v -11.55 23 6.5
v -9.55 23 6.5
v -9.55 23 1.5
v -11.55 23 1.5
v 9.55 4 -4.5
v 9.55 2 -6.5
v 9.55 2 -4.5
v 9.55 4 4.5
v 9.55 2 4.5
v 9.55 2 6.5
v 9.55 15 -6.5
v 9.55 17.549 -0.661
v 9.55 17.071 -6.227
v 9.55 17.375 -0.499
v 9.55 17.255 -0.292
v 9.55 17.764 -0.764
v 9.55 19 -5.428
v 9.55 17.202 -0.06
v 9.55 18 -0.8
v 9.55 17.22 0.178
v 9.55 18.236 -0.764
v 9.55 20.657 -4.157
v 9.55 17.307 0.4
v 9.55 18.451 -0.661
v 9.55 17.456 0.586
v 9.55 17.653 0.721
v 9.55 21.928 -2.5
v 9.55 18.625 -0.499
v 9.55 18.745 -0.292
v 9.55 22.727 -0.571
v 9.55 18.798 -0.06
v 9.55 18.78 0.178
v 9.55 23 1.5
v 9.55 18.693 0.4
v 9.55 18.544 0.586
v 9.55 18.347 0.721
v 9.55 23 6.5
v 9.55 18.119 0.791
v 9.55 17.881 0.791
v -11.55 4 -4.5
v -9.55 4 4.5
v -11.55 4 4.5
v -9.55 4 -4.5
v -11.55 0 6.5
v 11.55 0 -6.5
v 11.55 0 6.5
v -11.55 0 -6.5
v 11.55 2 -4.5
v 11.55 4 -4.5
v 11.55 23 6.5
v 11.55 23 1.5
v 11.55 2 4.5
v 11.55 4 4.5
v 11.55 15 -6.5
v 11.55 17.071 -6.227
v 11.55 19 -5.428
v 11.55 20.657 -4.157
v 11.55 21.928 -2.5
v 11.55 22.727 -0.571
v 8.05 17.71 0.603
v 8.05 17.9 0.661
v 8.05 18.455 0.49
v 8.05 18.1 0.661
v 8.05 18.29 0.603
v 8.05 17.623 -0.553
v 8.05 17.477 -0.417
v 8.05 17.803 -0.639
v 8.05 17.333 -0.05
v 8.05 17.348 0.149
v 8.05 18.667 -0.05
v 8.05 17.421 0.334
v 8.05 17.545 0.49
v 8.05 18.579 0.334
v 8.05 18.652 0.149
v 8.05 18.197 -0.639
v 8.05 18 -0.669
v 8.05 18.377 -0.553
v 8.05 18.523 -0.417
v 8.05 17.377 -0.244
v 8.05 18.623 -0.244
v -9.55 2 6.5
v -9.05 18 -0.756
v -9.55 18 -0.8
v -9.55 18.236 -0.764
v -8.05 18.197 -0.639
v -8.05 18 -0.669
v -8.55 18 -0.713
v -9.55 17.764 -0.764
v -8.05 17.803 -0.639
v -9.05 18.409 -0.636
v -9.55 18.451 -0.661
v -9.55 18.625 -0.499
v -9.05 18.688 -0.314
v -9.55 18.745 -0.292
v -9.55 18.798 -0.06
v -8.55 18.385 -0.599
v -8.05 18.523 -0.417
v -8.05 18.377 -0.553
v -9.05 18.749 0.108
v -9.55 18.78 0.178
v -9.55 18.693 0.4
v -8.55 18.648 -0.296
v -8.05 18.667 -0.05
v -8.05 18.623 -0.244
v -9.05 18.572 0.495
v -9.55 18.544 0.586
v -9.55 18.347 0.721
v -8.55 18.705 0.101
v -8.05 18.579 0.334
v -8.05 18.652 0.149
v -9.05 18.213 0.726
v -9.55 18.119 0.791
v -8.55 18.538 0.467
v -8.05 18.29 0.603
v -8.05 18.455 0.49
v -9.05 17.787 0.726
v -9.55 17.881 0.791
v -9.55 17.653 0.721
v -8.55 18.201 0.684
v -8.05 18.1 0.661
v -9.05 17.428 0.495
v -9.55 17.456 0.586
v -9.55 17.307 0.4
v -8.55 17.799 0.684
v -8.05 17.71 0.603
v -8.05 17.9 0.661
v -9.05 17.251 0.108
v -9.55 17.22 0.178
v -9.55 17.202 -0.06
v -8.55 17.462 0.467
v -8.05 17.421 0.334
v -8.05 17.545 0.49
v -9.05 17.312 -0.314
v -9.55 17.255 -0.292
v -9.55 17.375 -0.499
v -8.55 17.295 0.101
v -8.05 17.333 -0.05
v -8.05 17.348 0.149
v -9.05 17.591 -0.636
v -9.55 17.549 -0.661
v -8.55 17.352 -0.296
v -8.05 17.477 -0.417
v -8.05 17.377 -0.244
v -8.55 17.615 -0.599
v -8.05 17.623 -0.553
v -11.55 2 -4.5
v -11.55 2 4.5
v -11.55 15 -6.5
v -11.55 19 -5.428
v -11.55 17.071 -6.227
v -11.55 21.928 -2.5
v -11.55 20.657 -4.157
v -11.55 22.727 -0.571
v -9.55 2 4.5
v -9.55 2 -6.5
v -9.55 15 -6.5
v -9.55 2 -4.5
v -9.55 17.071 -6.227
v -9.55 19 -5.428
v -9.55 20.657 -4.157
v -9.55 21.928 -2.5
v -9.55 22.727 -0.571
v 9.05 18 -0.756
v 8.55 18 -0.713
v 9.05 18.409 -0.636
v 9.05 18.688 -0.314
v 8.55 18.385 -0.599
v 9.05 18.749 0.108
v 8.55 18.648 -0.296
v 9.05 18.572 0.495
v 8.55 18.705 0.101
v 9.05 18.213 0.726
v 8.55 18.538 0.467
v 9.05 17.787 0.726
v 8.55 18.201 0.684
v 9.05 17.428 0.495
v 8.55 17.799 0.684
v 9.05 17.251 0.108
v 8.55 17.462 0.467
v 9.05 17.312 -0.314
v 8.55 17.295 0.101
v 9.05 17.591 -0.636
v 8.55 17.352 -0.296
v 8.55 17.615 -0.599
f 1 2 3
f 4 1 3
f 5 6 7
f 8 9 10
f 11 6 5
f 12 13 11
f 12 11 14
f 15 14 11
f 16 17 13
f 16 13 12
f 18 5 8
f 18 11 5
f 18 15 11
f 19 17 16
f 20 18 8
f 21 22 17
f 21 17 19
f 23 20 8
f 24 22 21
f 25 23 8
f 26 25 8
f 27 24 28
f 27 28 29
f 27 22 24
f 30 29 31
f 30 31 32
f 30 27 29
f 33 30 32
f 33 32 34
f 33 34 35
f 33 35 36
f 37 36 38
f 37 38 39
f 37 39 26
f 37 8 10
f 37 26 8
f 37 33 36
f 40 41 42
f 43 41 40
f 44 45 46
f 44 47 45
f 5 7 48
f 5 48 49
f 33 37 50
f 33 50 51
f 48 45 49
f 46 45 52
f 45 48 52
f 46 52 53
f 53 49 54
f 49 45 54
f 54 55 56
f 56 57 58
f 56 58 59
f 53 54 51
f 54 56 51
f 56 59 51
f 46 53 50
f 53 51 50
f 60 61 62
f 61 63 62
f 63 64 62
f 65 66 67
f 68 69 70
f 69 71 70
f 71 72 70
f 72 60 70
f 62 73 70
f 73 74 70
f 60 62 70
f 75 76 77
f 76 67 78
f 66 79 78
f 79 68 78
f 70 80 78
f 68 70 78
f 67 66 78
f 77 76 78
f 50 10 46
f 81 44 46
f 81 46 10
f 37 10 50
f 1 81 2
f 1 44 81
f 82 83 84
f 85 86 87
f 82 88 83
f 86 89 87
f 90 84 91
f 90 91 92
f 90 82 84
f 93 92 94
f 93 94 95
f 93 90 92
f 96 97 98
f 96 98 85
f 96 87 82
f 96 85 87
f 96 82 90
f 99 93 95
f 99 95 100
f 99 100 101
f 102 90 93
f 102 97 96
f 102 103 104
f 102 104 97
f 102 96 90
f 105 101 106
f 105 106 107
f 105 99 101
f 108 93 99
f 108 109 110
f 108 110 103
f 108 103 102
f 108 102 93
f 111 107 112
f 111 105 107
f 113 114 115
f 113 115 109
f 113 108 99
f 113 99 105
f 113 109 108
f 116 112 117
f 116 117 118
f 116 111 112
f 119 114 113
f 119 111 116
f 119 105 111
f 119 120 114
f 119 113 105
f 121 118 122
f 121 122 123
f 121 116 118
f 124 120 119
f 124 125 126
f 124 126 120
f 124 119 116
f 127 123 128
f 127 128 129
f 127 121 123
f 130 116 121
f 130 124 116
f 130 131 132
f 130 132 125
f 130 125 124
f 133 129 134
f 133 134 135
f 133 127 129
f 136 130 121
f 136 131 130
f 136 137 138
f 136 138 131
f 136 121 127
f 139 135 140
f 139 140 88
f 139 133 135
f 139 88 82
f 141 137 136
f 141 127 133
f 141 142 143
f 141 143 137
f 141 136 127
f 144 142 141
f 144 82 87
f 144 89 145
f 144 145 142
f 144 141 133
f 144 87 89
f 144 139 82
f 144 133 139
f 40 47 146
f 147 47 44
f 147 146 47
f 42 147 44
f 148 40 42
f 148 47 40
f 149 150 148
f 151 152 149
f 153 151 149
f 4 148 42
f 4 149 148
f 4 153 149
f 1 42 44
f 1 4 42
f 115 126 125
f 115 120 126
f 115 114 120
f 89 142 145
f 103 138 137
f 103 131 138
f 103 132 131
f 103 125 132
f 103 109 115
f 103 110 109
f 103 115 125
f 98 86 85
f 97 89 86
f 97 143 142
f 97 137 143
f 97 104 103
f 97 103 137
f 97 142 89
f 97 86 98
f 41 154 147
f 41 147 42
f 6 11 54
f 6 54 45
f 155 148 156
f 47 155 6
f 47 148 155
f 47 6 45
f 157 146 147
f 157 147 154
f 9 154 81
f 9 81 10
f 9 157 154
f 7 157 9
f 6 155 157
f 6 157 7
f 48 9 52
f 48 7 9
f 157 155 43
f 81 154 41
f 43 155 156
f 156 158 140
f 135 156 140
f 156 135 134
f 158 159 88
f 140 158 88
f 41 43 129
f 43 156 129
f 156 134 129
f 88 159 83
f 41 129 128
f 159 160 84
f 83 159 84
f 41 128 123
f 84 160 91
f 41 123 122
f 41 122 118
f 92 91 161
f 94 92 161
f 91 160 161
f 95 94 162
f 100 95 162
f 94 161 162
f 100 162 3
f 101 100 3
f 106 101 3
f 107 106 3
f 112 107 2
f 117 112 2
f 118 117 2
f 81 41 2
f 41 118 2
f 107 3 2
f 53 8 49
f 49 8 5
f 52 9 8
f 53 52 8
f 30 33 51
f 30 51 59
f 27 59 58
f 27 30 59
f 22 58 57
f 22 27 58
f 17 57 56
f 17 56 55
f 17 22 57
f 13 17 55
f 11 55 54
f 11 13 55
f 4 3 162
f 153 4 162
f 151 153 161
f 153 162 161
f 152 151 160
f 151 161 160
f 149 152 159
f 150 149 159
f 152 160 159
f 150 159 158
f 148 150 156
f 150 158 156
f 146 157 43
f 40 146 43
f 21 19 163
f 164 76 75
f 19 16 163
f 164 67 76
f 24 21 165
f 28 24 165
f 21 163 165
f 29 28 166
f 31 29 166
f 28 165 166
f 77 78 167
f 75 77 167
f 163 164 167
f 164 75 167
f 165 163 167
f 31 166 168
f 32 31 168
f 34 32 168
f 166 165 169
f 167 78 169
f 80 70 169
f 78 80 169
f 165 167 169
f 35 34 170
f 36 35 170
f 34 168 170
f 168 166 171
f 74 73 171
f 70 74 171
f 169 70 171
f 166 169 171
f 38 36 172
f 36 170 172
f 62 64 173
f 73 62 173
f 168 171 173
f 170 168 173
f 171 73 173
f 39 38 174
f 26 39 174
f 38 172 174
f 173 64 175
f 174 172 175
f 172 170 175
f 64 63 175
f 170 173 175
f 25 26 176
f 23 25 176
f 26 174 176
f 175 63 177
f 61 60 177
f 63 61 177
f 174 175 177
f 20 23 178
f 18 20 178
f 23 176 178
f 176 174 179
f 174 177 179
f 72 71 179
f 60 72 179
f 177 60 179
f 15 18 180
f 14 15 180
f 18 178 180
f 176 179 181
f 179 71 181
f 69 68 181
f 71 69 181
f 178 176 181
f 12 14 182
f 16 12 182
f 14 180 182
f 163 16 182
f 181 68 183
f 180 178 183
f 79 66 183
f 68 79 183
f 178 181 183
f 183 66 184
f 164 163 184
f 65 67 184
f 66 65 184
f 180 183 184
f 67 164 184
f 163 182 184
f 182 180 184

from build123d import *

# Parameters (mm, degrees)
SKETCH2_W           = 19.1
SKETCH2_H           = 13
BOSS_EXTRUDE1_DEPTH = 2
BOSS_EXTRUDE2_DEPTH = 2
SKETCH4_R           = 0.8
BOSS_EXTRUDE3_DEPTH = 1.5
BOSS_EXTRUDE3_TAPER = 5
SKETCH5_W           = 9
SKETCH5_H           = 2
CUT_EXTRUDE1_DEPTH  = 2


with BuildPart() as part:
    # Sketch2 → Boss-Extrude1 (new body)
    with BuildSketch(Plane(origin=(0, 0, 0), x_dir=(1, 0, 0), z_dir=(0, 1, 0))):
        Rectangle(SKETCH2_W, SKETCH2_H)
    extrude(amount=BOSS_EXTRUDE1_DEPTH)

    # Sketch3 → Boss-Extrude2 (add)
    with BuildSketch(Plane.ZY.offset(9.55)):
        with BuildLine():
            Line((6.5, 0), (6.5, 23))
            Line((6.5, 23), (1.5, 23))
            ThreePointArc((1.5, 23), (-4.156854249, 20.656854249), (-6.5, 15))
            Line((-6.5, 15), (-6.5, 0))
            Line((-6.5, 0), (6.5, 0))
        make_face()
    boss_extrude2 = extrude(amount=BOSS_EXTRUDE2_DEPTH)

    # Sketch4 → Boss-Extrude3 (add)
    with BuildSketch(Plane(origin=(-9.55, 0, 0), x_dir=(0, 0, -1), z_dir=(1, 0, 0))):
        with Locations((0, 18)):
            Circle(SKETCH4_R)
    boss_extrude3 = extrude(amount=BOSS_EXTRUDE3_DEPTH, taper=BOSS_EXTRUDE3_TAPER)

    # Sketch5 → Cut-Extrude1 (cut)
    with BuildSketch(Plane(origin=(-9.55, 0, 0), x_dir=(0, 0, -1), z_dir=(1, 0, 0))):
        with Locations((0, 3)):
            Rectangle(SKETCH5_W, SKETCH5_H)
    cut_extrude1 = extrude(amount=-CUT_EXTRUDE1_DEPTH, mode=Mode.SUBTRACT)

    # Mirror1: Boss-Extrude2, Boss-Extrude3, Cut-Extrude1 across plane
    add(boss_extrude2.mirror(Plane(origin=(0, 0, 0), x_dir=(0, 0, 1), z_dir=(1, 0, 0))))
    add(boss_extrude3.mirror(Plane(origin=(0, 0, 0), x_dir=(0, 0, 1), z_dir=(1, 0, 0))))
    add(cut_extrude1.mirror(Plane(origin=(0, 0, 0), x_dir=(0, 0, 1), z_dir=(1, 0, 0))), mode=Mode.SUBTRACT)


solid = part.part
